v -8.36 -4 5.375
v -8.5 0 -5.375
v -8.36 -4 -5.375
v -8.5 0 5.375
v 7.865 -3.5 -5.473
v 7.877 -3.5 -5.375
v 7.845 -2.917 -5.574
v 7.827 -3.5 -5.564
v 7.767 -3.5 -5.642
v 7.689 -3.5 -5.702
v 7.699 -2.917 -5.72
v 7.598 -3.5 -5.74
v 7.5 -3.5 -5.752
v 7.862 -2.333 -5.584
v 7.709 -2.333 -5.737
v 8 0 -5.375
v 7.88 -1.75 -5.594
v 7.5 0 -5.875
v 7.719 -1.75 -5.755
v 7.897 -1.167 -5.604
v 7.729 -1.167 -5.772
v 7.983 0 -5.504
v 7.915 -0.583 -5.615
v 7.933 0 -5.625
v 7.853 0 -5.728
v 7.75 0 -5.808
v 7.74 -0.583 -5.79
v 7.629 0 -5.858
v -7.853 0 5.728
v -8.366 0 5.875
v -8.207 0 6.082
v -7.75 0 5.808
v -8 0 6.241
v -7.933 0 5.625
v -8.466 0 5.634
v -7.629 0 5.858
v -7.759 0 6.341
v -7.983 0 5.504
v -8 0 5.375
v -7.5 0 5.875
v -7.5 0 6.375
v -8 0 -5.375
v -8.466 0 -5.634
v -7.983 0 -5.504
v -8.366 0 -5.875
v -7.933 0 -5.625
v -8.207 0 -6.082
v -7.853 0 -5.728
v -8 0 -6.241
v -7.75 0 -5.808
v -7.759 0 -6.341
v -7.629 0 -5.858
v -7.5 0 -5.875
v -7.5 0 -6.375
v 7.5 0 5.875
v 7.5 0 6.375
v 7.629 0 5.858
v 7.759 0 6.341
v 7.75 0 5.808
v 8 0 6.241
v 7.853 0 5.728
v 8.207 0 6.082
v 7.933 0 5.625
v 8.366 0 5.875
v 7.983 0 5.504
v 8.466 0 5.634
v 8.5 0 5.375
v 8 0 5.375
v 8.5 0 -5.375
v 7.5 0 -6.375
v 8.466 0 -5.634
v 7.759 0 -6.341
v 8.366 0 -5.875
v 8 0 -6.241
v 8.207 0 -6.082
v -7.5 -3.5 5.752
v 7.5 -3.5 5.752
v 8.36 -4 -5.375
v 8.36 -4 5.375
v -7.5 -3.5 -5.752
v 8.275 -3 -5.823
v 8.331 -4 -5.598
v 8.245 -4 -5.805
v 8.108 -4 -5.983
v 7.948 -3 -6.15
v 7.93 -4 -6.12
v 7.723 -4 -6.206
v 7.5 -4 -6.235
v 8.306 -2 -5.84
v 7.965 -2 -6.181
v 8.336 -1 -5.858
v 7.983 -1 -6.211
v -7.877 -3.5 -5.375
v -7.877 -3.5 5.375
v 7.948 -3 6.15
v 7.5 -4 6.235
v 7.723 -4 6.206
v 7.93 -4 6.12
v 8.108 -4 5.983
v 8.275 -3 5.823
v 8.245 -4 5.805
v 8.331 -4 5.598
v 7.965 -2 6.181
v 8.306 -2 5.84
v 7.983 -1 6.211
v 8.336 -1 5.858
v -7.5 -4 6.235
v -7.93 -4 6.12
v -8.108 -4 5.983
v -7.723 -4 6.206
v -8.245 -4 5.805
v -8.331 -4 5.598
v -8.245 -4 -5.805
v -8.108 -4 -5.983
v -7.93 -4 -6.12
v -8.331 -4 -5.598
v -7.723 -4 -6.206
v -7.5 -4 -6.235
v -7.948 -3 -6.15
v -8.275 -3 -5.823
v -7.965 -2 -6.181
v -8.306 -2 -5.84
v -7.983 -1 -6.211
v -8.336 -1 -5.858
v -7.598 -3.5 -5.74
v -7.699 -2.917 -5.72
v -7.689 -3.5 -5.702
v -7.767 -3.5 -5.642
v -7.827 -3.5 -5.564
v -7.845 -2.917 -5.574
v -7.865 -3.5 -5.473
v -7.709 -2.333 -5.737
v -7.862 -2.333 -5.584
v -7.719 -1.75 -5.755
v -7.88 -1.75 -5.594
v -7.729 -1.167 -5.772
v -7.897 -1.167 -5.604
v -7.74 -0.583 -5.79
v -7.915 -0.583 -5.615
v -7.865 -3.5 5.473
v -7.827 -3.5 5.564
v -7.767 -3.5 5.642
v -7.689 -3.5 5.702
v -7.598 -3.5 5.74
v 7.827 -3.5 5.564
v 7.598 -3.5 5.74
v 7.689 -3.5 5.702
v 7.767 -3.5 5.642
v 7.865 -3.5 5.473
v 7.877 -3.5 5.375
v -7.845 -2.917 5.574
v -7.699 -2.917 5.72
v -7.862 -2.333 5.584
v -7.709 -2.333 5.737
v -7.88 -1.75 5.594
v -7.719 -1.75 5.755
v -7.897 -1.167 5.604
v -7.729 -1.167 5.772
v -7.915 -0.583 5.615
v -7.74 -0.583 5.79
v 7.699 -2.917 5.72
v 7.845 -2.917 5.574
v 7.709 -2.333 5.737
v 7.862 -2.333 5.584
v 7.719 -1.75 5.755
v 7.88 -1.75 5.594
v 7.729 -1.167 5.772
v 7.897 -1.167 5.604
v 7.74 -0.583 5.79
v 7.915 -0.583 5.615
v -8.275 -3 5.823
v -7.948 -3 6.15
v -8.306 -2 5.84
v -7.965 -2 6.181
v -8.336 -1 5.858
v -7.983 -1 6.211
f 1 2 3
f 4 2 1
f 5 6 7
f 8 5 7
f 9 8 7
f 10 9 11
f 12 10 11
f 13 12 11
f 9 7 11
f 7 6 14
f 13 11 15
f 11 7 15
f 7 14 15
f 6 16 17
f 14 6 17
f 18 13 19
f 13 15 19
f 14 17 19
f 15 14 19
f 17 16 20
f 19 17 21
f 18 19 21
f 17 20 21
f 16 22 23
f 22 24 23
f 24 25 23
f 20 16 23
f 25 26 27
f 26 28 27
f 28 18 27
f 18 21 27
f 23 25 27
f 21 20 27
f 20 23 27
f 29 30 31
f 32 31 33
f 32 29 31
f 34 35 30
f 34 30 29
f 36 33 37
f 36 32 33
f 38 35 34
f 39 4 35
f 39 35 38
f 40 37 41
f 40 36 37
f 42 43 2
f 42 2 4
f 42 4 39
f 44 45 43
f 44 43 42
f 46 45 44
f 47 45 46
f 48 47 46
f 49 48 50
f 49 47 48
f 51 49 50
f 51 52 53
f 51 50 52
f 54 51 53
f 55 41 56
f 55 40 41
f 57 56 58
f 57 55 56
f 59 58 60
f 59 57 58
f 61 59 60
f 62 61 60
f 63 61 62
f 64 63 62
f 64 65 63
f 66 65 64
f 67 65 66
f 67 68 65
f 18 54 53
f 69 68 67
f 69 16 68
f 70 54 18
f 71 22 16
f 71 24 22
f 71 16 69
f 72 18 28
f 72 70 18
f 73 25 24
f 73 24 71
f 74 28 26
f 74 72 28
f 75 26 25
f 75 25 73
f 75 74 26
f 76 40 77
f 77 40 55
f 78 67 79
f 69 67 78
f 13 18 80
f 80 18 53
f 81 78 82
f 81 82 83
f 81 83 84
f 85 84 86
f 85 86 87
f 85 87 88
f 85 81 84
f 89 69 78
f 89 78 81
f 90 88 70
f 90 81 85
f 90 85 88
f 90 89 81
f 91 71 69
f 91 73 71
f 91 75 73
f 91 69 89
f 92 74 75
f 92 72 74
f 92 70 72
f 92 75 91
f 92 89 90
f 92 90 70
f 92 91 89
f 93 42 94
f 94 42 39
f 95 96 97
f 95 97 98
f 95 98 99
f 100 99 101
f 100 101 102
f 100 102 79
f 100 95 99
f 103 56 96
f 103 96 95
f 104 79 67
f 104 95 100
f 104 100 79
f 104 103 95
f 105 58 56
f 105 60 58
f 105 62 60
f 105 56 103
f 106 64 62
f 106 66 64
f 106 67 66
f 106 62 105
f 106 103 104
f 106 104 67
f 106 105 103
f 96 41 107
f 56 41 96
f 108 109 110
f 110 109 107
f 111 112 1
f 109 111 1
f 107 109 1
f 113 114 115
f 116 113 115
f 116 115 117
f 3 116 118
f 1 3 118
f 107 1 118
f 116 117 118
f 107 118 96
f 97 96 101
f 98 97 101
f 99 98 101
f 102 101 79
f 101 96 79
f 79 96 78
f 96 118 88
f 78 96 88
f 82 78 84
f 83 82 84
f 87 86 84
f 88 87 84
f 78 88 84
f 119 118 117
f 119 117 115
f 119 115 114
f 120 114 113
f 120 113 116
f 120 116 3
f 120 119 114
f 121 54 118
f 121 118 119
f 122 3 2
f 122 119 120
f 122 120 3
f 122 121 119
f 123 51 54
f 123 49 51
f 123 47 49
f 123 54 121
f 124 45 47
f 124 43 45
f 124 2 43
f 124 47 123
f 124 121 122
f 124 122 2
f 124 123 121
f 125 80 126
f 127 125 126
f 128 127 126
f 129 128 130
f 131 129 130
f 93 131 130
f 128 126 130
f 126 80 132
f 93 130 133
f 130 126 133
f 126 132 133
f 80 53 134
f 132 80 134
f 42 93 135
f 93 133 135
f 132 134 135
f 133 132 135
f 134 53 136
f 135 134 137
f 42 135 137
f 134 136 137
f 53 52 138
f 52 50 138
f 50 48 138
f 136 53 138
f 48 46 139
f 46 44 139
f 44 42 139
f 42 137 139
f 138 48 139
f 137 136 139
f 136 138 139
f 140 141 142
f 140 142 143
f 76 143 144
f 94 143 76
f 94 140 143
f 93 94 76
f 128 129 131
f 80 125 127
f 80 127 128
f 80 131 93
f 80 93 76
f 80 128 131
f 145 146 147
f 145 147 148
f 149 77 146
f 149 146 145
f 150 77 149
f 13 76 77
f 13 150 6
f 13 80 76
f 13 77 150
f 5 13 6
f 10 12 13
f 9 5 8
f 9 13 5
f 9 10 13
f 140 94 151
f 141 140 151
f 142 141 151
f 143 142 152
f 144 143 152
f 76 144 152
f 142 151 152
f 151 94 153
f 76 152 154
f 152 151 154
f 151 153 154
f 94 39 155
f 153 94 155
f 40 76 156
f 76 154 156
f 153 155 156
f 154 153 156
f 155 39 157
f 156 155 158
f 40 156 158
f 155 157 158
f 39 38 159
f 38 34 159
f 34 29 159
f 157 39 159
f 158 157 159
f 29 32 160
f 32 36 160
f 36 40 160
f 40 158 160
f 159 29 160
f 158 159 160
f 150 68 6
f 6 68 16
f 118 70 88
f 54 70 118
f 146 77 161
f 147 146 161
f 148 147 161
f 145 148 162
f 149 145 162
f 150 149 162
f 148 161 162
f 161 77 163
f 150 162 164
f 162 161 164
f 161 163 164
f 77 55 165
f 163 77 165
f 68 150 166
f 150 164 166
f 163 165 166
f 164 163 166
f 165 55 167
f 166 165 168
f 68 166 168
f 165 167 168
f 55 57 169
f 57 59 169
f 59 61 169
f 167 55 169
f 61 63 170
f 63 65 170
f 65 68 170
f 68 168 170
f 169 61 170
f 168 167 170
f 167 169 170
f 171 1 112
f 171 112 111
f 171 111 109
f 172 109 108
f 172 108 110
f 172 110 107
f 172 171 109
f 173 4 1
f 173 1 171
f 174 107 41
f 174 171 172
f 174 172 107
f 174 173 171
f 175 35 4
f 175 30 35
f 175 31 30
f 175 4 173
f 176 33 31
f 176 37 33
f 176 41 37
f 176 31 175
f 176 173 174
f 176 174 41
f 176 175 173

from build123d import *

# Parameters (mm, degrees)
BOSS_EXTRUDE1_DEPTH = 4
BOSS_EXTRUDE1_DRAFT = -2
SHELL1_T            = -0.5


with BuildPart() as part:
    # Sketch1 → Boss-Extrude1 (with draft: the straight prism first)
    with BuildSketch(Plane(origin=(0, 0, 0), x_dir=(1, 0, 0), z_dir=(0, 1, 0))):
        with BuildLine():
            Line((-7.5, -6.375), (7.5, -6.375))
            ThreePointArc((7.5, -6.375), (8.207106781, -6.082106781), (8.5, -5.375))
            Line((8.5, -5.375), (8.5, 5.375))
            ThreePointArc((8.5, 5.375), (8.207106781, 6.082106781), (7.5, 6.375))
            Line((7.5, 6.375), (-7.5, 6.375))
            ThreePointArc((-7.5, 6.375), (-8.207106781, 6.082106781), (-8.5, 5.375))
            Line((-8.5, 5.375), (-8.5, -5.375))
            ThreePointArc((-8.5, -5.375), (-8.207106781, -6.082106781), (-7.5, -6.375))
        make_face()
    extrude(amount=-BOSS_EXTRUDE1_DEPTH)
    # Boss-Extrude1: the draft: its side faces are tilted about the plane it starts from
    boss_extrude1_sides = [part.faces().sort_by_distance(p)[0] for p in [
        (0, -2, 6.375),
        (8.207106781, -2, 6.082106781),
        (8.5, -2, 0),
        (8.207106781, -2, -6.082106781),
        (0, -2, -6.375),
        (-8.207106781, -2, -6.082106781),
        (-8.5, -2, 0),
        (-8.207106781, -2, 6.082106781),
    ]]
    draft(boss_extrude1_sides, Plane(origin=(0, 0, 0), x_dir=(1, 0, 0), z_dir=(0, 1, 0)), BOSS_EXTRUDE1_DRAFT)

    # Shell1
    shell1_openings = [part.faces().sort_by_distance(p)[0] for p in [
        (0, 0, 0),
    ]]
    offset(amount=SHELL1_T, openings=shell1_openings, kind=Kind.INTERSECTION)


solid = part.part
